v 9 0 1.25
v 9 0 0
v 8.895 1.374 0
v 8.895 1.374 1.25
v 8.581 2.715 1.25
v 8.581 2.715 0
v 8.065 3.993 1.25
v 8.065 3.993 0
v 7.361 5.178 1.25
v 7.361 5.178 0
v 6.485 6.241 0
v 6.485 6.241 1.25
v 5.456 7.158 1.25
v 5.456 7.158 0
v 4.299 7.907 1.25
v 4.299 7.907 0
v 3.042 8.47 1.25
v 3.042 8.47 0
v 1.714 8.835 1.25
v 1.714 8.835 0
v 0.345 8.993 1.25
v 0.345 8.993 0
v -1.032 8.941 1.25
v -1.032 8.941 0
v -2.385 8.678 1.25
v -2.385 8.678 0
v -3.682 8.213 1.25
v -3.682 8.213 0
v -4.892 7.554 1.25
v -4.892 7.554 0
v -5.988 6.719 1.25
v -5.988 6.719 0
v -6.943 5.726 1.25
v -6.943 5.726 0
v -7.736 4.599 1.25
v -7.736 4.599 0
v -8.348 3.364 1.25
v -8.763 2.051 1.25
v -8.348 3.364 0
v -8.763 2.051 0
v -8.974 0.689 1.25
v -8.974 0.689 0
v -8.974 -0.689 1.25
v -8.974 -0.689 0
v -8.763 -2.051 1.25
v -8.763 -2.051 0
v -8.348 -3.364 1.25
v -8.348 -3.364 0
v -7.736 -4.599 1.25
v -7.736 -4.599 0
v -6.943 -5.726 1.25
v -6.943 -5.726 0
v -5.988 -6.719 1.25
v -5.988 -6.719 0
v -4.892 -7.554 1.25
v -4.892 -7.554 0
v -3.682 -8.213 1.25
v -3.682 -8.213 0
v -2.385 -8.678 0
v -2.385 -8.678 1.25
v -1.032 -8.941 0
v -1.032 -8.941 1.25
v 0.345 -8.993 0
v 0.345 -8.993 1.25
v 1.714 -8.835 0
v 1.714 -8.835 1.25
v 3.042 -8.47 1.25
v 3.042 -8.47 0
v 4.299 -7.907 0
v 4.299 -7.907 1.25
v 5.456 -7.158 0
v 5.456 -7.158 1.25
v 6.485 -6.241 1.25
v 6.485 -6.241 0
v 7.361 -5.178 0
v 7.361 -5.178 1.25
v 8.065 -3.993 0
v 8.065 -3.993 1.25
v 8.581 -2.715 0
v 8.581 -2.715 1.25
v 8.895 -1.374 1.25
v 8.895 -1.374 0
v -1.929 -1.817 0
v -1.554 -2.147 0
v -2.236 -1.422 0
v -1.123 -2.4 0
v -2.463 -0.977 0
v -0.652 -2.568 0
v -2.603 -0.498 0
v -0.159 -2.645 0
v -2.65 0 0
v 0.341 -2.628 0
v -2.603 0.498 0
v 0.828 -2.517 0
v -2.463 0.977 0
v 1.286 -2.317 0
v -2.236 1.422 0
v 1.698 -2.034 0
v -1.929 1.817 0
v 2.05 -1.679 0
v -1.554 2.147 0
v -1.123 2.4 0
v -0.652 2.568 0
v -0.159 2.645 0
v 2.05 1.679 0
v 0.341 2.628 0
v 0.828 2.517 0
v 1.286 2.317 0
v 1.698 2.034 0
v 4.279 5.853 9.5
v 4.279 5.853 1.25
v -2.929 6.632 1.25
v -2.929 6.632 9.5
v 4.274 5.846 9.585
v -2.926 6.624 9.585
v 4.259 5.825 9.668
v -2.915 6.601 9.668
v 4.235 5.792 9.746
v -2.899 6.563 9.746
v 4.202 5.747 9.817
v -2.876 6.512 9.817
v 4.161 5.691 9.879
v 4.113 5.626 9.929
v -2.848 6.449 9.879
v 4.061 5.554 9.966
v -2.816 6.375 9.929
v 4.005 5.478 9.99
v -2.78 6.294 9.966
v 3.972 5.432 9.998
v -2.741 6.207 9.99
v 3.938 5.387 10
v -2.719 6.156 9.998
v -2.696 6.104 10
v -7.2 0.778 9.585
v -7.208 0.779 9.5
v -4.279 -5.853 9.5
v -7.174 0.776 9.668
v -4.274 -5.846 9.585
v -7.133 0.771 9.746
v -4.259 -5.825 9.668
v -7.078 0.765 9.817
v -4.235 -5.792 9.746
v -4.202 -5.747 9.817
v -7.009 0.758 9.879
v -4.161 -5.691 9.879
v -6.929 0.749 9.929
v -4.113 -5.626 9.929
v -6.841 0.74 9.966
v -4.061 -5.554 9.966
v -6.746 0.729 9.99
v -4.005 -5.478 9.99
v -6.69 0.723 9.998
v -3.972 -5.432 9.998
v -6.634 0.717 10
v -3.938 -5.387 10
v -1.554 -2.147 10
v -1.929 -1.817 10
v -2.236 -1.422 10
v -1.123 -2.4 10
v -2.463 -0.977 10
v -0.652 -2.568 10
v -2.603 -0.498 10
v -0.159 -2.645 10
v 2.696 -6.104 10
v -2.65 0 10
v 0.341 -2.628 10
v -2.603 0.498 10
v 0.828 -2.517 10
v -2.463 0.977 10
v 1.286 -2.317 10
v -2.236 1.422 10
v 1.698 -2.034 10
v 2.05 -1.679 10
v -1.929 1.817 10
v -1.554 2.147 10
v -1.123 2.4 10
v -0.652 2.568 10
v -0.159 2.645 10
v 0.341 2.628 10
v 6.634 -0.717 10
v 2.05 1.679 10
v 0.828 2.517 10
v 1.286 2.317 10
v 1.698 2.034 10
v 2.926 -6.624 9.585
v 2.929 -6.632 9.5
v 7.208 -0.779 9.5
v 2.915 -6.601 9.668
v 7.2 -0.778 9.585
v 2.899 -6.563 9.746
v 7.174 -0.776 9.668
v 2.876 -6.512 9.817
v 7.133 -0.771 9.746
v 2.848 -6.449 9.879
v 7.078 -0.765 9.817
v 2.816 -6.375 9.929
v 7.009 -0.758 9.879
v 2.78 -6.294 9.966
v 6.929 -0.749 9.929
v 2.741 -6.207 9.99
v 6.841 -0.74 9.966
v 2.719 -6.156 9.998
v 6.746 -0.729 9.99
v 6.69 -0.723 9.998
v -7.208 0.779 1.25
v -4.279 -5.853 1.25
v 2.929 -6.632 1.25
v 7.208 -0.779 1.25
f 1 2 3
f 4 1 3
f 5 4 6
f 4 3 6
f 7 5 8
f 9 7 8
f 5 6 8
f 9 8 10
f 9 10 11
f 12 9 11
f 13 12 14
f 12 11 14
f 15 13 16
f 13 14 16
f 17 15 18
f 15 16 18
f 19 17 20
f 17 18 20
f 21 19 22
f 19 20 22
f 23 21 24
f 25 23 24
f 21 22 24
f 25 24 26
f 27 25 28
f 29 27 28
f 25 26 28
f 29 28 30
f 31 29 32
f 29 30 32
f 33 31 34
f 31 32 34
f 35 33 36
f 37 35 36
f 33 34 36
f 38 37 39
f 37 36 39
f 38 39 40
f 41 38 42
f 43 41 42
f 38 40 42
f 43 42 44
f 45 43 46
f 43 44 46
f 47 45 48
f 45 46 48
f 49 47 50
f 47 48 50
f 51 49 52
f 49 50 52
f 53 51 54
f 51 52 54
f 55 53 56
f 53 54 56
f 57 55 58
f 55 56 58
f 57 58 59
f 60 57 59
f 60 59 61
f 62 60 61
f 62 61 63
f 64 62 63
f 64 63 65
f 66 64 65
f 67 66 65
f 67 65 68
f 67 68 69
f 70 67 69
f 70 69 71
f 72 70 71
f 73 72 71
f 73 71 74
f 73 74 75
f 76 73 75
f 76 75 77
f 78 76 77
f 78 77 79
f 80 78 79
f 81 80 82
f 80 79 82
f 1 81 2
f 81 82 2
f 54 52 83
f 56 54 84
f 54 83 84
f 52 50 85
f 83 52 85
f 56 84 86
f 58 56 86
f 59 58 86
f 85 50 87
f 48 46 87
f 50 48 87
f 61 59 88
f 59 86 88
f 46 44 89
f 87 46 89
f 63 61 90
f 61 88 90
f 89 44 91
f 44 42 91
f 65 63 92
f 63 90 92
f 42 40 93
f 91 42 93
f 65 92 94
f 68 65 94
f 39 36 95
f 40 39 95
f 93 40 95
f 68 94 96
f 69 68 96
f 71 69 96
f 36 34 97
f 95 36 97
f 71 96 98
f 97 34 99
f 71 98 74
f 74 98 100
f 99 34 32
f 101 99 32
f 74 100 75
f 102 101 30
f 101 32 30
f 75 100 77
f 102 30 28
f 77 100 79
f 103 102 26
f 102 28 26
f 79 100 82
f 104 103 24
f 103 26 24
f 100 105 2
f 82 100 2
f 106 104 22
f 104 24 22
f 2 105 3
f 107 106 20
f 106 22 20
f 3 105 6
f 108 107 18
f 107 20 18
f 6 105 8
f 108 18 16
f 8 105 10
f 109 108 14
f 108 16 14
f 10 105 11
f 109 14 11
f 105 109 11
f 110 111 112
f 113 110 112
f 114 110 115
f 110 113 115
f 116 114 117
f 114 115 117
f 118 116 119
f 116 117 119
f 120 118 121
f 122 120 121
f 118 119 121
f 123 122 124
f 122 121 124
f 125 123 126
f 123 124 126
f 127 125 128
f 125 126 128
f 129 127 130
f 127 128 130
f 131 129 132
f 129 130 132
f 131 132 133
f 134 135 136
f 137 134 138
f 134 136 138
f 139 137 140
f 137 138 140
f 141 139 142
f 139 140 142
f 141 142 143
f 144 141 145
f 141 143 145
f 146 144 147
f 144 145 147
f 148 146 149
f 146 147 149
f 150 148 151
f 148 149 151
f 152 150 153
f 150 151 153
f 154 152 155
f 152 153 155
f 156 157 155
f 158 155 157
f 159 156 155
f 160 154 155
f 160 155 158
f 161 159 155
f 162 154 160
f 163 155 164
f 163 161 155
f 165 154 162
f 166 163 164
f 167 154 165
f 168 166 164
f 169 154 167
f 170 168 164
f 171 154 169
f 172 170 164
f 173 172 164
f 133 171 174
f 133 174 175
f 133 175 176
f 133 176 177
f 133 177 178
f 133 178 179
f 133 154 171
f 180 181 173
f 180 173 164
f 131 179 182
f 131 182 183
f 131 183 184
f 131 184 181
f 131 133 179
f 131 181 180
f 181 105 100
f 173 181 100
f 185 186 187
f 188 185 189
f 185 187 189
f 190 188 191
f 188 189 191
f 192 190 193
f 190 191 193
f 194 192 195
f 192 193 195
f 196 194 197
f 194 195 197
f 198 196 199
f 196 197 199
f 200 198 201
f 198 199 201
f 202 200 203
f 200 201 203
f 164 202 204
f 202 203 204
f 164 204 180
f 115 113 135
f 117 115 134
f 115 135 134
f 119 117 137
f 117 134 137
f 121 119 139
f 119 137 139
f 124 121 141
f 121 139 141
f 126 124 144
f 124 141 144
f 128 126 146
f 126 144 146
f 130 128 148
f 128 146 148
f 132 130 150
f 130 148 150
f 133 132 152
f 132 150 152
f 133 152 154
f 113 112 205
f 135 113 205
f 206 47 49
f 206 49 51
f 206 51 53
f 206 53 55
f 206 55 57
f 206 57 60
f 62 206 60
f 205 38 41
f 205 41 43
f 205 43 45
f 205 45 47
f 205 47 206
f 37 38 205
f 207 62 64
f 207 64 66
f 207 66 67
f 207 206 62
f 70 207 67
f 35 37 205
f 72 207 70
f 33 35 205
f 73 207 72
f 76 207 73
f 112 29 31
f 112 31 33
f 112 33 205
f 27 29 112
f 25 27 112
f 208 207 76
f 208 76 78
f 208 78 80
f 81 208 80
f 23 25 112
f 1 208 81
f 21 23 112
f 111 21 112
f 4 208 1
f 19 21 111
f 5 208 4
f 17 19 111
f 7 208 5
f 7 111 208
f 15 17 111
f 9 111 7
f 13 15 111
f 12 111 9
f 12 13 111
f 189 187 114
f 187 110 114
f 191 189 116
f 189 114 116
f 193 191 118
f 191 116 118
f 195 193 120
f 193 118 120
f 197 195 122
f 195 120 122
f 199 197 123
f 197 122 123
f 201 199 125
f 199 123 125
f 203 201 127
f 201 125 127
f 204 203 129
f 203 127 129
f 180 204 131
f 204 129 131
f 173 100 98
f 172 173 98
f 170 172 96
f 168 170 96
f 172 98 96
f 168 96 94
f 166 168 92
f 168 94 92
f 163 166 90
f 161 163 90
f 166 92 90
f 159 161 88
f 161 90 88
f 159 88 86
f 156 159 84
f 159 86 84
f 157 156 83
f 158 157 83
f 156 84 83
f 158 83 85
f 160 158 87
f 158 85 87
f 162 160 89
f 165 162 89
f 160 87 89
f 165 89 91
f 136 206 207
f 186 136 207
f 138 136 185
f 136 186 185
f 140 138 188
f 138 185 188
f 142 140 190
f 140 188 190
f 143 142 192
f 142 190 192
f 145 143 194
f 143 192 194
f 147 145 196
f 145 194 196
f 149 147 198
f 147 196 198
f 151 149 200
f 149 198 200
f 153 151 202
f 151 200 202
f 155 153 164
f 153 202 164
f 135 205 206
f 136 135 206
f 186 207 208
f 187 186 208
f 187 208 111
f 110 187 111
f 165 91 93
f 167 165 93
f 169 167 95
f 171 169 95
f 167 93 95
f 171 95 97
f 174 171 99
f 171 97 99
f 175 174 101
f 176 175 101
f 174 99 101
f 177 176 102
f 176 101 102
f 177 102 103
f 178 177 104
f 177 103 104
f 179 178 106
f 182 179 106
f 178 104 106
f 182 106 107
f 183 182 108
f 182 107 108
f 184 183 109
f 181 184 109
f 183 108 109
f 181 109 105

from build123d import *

# Parameters (mm, degrees)
F1_DEPTH = 10
F0_R     = 9
F2_DEPTH = 1.25
F3_R     = 0.5


with BuildPart() as f1:
    # F0 (on Top) → F1 (new body)
    with BuildSketch(Plane.XY):
        Polygon((-7.207986, 0.779381), (-4.278957, -5.852609), (2.92903, -6.63199), (7.207986, -0.779381), (4.278957, 5.852609), (-2.92903, 6.63199), align=None)
        with BuildLine():
            ThreePointArc((2.05, 1.679286), (2.495496, 0.891628), (2.65, 0))
            ThreePointArc((2.65, 0), (2.495496, -0.891628), (2.05, -1.679286))
            ThreePointArc((2.05, -1.679286), (-0.891628, -2.495496), (-2.65, 0))
            ThreePointArc((-2.65, 0), (-0.891628, 2.495496), (2.05, 1.679286))
        make_face(mode=Mode.SUBTRACT)
        with BuildLine():
            ThreePointArc((2.05, -1.679286), (2.495496, -0.891628), (2.65, 0))
            ThreePointArc((2.65, 0), (2.495496, 0.891628), (2.05, 1.679286))
            Line((2.05, 1.679286), (2.05, 0))
            Line((2.05, 0), (2.05, -1.679286))
        make_face()
    extrude(amount=F1_DEPTH)

    # F0 (on Top) → F2 (join)
    with BuildSketch(Plane.XY):
        Circle(F0_R)
        Polygon((2.92903, -6.63199), (-4.278957, -5.852609), (-7.207986, 0.779381), (-2.92903, 6.63199), (4.278957, 5.852609), (7.207986, -0.779381), align=None, mode=Mode.SUBTRACT)
    extrude(amount=F2_DEPTH)

    # F3
    f3_edges = [f1.edges().sort_by_distance(p)[0] for p in [
        (-0.674963, -6.242299, 10),
        (5.068508, -3.705685, 10),
        (5.743471, 2.536614, 10),
        (0.674963, 6.242299, 10),
        (-5.068508, 3.705685, 10),
        (-5.743471, -2.536614, 10),
    ]]
    fillet(f3_edges, radius=F3_R)


solid = f1.part
